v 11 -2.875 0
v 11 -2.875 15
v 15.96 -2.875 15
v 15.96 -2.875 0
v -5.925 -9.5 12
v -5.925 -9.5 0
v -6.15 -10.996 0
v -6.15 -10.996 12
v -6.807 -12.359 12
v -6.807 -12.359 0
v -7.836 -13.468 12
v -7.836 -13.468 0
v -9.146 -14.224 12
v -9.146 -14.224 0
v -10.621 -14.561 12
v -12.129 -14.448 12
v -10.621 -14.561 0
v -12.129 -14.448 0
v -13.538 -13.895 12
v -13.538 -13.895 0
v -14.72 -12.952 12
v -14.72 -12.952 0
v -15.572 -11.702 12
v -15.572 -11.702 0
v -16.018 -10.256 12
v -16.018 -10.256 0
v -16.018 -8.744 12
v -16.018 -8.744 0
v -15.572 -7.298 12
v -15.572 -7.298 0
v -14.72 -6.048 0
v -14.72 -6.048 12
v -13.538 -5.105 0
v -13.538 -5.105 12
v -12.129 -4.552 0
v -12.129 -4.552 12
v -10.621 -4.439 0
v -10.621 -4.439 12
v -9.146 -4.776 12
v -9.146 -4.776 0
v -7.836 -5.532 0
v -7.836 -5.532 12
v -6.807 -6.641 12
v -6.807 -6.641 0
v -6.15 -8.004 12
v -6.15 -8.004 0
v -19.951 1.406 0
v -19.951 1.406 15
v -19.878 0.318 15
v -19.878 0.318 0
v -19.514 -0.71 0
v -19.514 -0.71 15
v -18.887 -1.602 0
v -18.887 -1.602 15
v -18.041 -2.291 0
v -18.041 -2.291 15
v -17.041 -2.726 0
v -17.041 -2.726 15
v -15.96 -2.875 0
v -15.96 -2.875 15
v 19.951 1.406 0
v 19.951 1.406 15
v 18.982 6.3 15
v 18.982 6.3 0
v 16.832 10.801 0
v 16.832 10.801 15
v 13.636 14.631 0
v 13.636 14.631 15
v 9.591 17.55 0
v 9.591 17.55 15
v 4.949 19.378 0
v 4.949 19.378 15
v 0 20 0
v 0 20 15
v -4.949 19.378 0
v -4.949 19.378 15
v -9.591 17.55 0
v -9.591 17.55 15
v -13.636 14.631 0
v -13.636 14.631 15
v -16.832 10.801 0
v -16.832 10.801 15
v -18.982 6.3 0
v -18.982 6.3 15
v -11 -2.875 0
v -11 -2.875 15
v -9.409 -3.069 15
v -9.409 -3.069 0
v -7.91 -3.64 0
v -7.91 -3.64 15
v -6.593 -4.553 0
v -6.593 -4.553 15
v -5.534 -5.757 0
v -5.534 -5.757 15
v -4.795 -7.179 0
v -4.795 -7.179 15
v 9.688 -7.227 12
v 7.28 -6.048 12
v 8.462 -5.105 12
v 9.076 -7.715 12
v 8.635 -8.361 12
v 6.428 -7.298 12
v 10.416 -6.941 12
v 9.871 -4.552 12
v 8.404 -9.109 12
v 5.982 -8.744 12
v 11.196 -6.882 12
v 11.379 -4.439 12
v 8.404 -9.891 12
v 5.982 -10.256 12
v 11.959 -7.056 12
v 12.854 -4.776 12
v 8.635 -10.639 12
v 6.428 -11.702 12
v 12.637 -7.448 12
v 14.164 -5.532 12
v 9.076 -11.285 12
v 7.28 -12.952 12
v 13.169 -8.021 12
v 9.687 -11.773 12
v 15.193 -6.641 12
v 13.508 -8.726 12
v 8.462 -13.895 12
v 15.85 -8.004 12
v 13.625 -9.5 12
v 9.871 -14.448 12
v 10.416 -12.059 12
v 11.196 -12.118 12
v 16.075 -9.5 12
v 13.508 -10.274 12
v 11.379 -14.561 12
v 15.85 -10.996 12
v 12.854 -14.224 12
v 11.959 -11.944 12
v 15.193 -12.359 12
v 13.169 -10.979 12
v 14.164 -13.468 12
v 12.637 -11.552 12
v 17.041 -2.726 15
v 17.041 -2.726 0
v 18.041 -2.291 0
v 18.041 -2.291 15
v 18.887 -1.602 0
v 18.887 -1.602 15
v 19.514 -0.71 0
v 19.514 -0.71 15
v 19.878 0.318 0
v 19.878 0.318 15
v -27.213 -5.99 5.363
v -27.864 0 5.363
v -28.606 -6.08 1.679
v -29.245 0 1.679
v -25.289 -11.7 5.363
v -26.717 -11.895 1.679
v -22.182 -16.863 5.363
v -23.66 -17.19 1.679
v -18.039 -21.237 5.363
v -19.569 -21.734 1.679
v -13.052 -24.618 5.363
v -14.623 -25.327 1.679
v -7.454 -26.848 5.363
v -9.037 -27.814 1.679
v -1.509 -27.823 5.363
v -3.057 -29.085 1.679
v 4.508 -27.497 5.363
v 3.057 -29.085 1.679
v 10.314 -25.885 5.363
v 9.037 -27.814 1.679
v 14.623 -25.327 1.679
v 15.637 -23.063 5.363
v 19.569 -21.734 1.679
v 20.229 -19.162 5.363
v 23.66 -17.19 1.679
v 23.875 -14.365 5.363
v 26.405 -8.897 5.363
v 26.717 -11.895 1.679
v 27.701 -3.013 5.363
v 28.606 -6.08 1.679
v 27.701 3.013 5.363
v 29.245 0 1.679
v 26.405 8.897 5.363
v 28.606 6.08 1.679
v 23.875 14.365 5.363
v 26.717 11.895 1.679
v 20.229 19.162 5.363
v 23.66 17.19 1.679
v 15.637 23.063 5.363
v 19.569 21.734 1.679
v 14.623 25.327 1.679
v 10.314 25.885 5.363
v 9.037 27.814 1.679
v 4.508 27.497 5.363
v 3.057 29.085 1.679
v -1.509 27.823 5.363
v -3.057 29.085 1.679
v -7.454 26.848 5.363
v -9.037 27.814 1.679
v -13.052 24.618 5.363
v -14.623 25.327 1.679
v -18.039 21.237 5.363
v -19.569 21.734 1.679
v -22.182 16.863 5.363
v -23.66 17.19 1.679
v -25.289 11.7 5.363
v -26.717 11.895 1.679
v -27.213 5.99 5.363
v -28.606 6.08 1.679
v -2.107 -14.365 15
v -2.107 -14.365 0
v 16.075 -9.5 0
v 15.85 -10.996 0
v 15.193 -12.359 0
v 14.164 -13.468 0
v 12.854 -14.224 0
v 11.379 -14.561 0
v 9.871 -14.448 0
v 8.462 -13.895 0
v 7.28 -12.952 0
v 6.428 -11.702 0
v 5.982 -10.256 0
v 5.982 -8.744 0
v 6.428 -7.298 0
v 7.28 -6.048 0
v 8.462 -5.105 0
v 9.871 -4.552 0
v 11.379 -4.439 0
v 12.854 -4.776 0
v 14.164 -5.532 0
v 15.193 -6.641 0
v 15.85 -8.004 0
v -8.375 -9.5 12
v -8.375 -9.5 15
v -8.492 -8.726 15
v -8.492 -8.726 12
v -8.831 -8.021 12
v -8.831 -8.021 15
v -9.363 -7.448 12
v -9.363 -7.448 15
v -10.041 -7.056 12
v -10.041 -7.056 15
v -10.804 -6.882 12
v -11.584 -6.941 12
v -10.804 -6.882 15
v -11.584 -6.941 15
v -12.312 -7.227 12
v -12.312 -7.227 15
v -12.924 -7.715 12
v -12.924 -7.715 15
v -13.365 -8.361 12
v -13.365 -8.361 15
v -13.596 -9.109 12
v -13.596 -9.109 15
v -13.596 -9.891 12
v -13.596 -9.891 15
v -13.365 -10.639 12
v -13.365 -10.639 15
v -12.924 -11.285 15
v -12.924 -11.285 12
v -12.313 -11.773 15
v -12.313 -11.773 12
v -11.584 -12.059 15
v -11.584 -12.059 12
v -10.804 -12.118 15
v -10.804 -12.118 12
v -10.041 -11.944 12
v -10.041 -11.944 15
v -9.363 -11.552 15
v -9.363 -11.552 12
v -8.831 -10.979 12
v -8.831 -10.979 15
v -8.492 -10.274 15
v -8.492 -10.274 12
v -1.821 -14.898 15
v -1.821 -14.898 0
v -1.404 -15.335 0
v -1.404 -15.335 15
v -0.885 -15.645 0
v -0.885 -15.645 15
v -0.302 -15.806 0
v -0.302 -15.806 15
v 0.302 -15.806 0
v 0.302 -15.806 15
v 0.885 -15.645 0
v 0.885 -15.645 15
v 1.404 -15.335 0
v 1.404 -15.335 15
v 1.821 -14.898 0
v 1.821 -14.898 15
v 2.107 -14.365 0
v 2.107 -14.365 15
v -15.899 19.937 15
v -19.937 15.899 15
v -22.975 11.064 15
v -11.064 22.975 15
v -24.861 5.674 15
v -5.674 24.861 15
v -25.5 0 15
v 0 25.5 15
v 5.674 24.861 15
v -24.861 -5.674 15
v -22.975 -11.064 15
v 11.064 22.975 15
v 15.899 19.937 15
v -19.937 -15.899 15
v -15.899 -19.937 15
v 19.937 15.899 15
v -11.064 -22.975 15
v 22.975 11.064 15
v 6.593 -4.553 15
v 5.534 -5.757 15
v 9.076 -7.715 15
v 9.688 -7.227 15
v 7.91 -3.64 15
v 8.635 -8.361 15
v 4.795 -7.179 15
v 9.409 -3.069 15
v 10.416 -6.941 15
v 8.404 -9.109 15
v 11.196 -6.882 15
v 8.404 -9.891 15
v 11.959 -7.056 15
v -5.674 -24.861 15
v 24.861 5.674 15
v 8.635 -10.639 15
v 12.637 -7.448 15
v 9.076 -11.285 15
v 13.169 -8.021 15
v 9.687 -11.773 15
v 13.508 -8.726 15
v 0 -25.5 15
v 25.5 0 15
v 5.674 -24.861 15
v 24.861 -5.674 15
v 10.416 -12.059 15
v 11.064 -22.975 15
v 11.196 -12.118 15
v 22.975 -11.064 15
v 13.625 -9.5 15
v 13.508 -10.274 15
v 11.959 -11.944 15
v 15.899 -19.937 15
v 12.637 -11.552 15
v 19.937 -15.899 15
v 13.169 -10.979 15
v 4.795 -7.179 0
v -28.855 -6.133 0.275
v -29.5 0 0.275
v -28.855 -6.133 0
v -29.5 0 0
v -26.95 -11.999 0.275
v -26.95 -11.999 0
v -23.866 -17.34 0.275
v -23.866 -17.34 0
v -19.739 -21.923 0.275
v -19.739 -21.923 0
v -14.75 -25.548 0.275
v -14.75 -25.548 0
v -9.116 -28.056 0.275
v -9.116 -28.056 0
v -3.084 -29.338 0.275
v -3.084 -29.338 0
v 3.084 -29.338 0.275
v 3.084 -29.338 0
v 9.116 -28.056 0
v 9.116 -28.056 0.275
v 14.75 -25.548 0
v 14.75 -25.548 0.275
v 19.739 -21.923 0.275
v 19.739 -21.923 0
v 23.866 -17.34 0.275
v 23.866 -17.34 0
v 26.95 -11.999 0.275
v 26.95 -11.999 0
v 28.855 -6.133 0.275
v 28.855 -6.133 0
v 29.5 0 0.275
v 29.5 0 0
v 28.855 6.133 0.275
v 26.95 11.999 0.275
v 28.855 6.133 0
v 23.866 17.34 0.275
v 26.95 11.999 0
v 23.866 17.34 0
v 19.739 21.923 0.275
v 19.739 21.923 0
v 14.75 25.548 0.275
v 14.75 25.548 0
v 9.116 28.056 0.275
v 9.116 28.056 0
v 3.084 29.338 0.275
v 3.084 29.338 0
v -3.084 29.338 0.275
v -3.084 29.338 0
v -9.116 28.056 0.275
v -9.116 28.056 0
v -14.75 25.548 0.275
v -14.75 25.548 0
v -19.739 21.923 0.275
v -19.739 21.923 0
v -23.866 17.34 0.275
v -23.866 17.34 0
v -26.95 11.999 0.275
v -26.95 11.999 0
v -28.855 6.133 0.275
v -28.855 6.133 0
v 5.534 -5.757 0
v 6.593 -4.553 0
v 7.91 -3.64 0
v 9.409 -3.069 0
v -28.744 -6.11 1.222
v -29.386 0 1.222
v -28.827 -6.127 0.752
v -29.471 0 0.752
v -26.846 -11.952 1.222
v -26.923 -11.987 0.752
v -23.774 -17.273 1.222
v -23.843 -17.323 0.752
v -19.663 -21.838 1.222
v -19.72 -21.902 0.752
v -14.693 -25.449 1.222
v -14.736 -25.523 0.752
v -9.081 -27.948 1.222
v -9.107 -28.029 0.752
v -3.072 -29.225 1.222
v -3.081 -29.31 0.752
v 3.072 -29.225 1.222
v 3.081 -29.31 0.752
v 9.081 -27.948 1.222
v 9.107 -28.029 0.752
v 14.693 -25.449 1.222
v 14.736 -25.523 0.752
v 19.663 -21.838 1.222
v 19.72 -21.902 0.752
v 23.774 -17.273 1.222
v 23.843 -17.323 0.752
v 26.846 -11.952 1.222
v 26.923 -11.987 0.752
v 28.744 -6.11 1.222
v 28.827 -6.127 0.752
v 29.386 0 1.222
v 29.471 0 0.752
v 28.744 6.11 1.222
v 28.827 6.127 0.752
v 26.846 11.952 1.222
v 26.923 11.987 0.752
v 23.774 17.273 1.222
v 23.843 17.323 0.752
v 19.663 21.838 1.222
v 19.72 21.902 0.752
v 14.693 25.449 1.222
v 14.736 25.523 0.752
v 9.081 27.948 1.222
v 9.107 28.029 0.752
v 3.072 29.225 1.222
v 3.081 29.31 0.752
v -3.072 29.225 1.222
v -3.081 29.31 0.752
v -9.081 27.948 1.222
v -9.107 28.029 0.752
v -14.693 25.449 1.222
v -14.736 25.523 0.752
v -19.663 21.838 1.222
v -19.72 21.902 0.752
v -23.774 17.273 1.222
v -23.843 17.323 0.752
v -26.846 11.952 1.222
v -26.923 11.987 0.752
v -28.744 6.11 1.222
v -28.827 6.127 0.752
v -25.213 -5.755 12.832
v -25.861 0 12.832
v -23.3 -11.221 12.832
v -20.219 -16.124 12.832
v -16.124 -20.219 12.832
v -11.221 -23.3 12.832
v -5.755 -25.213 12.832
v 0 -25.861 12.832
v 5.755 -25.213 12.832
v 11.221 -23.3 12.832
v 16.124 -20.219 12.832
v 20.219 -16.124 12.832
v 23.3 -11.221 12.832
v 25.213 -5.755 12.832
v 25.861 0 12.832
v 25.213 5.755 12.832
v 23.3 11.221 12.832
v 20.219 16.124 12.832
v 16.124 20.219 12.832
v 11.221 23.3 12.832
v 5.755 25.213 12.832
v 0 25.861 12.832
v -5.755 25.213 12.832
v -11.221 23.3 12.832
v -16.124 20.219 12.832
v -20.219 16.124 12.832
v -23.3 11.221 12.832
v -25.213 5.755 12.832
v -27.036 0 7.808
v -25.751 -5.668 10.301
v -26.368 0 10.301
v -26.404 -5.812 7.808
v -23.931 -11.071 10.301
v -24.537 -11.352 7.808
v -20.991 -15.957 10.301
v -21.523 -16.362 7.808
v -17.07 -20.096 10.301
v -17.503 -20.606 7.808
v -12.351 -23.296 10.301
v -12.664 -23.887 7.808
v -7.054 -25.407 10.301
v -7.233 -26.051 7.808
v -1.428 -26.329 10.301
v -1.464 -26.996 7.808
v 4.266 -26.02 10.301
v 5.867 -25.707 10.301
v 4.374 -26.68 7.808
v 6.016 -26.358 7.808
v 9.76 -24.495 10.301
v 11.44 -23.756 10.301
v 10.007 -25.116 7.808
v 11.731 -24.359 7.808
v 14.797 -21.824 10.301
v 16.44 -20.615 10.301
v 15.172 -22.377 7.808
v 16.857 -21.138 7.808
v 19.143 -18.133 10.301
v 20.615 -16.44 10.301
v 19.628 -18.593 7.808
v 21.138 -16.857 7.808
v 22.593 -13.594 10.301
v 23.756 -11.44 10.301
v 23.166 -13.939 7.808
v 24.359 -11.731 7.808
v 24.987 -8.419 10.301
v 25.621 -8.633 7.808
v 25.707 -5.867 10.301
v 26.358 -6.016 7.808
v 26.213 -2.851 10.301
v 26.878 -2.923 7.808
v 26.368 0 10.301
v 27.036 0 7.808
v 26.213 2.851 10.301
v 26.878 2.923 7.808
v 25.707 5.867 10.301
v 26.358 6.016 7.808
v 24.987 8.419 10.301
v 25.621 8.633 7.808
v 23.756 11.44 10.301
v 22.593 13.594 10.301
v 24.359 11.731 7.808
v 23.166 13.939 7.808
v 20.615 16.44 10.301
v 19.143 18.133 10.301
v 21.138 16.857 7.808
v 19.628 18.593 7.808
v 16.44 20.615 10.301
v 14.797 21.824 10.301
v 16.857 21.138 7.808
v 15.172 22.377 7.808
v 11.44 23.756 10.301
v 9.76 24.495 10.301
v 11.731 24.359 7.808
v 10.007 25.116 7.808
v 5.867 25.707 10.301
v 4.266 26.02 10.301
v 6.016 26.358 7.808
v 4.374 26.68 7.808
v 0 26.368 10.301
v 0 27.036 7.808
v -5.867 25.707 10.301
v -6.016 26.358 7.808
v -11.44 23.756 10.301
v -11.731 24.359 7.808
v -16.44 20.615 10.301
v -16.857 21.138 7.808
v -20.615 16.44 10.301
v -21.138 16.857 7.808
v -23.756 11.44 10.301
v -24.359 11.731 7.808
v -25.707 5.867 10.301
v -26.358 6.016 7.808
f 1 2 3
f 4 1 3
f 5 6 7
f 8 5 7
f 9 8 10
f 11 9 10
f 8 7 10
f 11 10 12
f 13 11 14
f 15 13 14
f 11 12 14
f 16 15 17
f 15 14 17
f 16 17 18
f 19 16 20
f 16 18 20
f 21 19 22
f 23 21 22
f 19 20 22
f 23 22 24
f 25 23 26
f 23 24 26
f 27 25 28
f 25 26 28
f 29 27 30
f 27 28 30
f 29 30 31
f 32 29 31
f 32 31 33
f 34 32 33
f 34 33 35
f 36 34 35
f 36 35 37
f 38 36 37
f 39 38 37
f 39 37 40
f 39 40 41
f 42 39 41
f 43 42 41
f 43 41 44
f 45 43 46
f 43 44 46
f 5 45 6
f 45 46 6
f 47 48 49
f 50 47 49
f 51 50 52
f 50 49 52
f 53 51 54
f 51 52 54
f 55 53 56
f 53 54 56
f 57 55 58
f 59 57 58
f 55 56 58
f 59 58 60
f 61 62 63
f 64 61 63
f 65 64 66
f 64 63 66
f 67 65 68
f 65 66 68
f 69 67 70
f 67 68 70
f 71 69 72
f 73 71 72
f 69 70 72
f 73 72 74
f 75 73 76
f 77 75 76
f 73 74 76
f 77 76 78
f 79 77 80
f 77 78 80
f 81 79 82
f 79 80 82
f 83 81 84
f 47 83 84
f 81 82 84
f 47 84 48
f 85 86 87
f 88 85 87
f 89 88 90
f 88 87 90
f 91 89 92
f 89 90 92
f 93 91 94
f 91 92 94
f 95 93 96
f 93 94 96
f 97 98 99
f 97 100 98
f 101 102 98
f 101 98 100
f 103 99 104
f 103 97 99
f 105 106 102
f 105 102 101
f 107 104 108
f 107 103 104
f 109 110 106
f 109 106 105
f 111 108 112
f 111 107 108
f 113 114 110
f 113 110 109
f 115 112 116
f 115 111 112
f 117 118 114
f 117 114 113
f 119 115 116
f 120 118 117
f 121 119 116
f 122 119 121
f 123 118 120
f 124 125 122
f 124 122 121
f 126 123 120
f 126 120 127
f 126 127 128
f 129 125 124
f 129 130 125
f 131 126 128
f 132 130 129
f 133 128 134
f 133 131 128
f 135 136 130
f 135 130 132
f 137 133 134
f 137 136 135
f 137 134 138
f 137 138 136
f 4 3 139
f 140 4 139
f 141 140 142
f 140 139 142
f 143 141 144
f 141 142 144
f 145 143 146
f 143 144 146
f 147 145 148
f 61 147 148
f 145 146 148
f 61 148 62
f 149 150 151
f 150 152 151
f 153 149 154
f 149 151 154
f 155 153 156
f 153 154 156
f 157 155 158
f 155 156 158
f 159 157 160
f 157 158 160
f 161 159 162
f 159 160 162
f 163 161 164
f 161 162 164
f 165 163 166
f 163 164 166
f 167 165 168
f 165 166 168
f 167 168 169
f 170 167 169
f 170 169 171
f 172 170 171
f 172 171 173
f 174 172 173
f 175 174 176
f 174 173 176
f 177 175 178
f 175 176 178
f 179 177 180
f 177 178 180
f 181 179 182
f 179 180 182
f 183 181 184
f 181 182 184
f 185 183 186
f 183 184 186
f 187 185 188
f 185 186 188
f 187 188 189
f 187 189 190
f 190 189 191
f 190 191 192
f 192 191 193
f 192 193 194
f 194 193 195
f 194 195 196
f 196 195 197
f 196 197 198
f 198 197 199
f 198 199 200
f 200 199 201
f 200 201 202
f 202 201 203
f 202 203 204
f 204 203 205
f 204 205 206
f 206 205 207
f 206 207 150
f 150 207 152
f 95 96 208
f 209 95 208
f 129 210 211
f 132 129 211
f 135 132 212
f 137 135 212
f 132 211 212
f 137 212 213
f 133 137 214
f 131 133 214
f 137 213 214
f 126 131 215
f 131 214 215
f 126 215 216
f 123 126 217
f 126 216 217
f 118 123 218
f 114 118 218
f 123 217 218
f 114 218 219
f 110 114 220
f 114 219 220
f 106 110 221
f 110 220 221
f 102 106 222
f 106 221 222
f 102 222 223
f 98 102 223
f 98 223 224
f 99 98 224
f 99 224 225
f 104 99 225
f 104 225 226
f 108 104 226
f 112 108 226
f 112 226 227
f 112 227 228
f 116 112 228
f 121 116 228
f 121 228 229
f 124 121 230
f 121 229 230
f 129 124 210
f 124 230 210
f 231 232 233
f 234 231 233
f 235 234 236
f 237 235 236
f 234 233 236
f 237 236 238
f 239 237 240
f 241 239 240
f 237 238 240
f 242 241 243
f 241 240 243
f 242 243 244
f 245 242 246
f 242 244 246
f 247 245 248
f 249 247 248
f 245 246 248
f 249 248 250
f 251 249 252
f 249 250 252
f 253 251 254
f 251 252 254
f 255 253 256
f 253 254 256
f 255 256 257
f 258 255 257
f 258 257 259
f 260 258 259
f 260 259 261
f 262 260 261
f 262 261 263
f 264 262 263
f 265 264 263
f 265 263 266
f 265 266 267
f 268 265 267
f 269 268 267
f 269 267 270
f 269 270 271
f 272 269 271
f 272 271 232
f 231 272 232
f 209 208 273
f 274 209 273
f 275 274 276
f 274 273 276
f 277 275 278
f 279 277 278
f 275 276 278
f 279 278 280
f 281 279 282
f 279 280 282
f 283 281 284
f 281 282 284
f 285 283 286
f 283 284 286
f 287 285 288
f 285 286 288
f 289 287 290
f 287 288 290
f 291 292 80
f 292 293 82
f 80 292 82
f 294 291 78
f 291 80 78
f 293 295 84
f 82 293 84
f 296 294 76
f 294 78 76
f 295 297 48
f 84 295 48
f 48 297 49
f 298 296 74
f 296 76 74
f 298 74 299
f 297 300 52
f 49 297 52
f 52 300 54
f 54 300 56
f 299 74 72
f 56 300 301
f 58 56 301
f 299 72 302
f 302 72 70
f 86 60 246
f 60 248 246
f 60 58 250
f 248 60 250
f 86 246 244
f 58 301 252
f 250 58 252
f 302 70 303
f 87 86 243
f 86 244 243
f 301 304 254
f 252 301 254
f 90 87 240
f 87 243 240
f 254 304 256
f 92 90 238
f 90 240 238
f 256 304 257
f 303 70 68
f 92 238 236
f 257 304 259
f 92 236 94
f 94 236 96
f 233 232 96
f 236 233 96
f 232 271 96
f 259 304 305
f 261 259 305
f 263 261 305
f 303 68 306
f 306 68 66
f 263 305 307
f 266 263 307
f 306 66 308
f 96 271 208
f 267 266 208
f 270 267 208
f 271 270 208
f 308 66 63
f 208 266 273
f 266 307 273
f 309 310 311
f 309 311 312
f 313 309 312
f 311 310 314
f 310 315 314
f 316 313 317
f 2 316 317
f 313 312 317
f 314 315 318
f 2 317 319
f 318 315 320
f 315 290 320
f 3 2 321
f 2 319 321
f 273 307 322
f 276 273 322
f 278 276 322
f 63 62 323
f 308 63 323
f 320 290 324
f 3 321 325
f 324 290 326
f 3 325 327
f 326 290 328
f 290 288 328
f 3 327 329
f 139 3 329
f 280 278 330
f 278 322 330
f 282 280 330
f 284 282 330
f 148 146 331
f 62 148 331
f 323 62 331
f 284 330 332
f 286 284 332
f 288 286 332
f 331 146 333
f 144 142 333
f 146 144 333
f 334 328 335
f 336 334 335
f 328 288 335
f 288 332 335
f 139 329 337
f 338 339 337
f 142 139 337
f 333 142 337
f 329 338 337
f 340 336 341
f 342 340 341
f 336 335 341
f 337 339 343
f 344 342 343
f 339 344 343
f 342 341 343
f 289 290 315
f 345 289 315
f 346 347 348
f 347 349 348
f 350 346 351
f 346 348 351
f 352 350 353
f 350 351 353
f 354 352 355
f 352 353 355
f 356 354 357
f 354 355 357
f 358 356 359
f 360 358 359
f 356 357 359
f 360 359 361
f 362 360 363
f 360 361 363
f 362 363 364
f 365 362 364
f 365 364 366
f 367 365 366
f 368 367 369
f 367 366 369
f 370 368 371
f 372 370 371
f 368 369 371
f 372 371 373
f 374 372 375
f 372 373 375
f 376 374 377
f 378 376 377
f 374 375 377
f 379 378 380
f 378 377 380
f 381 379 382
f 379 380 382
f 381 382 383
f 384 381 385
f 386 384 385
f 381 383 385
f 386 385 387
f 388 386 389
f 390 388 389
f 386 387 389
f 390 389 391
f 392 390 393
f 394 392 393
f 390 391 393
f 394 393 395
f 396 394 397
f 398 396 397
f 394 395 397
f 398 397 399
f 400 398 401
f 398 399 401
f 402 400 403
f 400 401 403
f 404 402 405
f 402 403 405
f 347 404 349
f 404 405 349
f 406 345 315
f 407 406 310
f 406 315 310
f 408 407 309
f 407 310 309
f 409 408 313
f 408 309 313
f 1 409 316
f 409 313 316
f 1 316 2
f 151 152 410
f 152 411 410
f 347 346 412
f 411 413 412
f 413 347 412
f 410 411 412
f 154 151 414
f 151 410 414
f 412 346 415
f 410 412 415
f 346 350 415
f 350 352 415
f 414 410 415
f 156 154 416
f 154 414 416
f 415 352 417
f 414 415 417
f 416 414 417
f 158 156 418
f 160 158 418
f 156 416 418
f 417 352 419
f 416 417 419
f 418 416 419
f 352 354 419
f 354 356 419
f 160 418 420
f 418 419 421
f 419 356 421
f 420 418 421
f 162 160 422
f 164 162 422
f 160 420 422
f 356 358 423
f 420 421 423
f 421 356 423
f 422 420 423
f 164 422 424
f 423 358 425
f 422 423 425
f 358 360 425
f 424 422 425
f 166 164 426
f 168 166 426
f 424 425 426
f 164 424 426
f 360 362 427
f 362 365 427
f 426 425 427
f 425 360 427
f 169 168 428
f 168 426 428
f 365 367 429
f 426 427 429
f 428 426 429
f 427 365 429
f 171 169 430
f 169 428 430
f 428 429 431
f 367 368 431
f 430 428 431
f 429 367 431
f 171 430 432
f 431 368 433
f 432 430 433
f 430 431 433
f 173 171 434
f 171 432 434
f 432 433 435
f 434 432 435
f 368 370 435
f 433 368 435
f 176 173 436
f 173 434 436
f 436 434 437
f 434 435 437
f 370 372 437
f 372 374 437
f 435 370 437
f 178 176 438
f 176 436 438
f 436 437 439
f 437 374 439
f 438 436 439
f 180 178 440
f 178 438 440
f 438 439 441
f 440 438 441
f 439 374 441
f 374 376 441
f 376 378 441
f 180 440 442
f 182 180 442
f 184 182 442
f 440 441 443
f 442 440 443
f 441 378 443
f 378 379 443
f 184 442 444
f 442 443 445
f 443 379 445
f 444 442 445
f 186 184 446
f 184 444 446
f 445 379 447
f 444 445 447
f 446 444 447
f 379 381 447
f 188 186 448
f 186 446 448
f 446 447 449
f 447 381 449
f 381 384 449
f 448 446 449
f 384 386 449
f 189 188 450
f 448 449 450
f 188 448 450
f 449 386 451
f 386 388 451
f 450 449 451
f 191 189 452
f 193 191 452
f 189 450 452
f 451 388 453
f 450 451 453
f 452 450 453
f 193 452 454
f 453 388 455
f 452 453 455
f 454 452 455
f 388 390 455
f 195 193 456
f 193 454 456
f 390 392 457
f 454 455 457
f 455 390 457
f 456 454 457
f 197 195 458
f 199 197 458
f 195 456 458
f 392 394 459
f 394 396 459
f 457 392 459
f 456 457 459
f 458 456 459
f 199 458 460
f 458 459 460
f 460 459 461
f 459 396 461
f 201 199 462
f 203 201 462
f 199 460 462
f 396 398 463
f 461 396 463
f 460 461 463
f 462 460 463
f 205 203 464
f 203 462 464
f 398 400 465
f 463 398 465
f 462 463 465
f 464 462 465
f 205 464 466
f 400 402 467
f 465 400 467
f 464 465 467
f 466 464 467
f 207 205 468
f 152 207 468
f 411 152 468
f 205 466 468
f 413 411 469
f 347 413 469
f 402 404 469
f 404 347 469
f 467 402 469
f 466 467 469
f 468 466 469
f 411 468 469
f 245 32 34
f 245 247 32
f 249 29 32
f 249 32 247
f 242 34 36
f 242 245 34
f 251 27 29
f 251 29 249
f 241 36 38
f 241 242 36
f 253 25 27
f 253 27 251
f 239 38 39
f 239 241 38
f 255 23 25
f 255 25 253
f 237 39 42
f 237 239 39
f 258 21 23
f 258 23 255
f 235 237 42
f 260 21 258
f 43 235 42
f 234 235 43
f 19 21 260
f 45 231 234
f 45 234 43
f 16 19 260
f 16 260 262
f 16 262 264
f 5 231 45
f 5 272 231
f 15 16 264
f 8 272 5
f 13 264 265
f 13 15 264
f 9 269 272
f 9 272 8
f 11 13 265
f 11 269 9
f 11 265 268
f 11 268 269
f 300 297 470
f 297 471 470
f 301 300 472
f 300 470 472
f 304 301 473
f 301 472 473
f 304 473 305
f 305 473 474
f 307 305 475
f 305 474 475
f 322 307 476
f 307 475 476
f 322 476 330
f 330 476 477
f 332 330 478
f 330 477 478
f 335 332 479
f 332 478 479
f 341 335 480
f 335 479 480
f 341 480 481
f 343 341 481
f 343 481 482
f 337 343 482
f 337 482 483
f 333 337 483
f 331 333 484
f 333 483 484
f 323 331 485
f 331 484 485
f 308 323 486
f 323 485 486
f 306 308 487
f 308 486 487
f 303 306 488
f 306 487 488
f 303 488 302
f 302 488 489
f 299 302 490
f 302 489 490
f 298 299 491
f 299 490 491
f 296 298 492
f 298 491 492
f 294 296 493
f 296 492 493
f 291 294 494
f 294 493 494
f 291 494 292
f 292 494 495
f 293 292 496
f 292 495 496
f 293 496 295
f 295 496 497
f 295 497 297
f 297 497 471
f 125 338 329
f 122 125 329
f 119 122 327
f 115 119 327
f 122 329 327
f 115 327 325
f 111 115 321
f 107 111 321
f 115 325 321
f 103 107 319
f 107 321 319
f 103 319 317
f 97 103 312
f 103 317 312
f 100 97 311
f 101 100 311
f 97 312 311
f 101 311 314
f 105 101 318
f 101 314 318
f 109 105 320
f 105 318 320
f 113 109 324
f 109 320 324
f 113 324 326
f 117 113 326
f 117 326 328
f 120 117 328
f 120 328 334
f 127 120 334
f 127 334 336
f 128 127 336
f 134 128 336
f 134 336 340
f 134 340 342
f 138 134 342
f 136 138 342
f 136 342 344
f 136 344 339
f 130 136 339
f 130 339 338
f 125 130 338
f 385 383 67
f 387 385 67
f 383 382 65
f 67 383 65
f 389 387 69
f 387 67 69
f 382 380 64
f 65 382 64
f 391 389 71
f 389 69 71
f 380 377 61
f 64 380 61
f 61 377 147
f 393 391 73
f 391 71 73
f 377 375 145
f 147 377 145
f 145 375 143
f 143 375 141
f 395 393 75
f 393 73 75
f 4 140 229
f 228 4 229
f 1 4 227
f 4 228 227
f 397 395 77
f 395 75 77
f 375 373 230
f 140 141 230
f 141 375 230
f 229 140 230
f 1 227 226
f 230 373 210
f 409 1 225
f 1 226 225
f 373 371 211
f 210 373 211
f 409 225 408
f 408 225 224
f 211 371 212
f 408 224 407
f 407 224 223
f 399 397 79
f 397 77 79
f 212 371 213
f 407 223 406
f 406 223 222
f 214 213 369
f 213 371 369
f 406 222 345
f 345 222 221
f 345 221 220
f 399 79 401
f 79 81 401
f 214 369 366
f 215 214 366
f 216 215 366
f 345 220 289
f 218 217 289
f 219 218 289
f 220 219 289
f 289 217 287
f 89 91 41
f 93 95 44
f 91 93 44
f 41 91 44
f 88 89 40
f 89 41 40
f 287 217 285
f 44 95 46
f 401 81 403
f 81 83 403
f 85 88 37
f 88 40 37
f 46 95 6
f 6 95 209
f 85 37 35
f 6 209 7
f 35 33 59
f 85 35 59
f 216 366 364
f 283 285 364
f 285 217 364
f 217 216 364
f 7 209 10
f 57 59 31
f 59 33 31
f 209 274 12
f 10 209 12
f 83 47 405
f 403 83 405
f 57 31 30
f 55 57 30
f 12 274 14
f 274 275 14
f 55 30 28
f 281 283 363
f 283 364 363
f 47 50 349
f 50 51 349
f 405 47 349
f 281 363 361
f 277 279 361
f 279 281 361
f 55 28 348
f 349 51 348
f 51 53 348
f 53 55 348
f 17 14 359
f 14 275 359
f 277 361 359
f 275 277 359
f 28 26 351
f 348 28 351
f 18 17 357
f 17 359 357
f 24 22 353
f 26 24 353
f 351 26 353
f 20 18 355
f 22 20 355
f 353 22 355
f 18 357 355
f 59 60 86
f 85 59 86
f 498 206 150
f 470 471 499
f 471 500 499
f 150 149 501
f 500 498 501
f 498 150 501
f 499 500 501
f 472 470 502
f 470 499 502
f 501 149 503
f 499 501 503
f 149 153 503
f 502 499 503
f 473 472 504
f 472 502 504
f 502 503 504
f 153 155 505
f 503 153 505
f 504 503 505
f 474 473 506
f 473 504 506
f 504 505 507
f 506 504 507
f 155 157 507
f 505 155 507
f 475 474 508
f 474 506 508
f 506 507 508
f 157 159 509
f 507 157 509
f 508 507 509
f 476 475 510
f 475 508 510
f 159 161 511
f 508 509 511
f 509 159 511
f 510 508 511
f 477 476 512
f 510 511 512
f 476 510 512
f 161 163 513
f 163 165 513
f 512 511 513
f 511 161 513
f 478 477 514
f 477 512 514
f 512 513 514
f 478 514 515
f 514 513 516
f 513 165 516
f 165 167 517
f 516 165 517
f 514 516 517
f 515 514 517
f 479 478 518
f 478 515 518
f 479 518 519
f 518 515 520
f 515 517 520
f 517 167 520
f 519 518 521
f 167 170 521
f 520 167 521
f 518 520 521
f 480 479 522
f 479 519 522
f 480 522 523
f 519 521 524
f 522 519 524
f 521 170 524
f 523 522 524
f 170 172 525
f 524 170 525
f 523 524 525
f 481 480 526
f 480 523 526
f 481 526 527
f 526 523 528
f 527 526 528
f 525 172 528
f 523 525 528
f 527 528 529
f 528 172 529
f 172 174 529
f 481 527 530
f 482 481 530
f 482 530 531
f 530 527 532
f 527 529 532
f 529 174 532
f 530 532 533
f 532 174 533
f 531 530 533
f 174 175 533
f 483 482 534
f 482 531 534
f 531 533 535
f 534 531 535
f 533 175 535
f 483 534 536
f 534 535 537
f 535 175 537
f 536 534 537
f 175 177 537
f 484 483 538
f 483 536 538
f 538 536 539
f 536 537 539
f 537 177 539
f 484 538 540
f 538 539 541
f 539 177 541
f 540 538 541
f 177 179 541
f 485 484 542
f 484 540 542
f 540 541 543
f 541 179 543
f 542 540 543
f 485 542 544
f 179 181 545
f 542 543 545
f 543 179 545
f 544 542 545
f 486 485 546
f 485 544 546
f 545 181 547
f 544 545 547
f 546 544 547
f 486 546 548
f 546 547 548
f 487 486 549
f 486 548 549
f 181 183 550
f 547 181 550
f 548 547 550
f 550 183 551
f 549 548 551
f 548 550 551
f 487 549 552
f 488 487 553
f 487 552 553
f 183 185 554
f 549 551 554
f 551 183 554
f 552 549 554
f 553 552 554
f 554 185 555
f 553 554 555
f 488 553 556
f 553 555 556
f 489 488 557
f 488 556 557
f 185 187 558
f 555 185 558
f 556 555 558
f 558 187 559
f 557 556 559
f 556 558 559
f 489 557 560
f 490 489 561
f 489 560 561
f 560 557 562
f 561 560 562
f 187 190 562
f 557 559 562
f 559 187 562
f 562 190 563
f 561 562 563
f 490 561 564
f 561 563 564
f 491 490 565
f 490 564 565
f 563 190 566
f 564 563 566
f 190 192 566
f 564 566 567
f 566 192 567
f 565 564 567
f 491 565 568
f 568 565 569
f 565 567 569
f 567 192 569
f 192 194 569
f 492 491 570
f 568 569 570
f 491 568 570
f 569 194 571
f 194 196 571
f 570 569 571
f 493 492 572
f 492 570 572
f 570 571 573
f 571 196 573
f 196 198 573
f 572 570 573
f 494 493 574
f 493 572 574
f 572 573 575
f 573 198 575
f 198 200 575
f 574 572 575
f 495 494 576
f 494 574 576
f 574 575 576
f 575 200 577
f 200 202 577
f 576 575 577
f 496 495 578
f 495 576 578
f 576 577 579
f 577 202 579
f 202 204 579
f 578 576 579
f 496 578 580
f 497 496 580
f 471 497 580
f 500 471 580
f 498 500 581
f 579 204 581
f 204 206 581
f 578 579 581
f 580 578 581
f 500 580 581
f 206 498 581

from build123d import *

# Parameters (mm, degrees)
F2_R     = 2.625
F3_DEPTH = 15.001
F4_R     = 5.075
F5_DEPTH = 12


with BuildPart() as f1:
    # F0 (on Front) → F1 (revolve)
    with BuildSketch(Plane.XZ):
        with BuildLine():
            Line((-29.5, 0.274662), (-29.5, 0))
            Line((-29.5, 0), (0, 0))
            Line((0, 0), (0, 15))
            Line((0, 15), (-25.5, 15))
            Line((-25.5, 15), (-25.861378, 12.831729))
            ThreePointArc((-25.861378, 12.831729), (-26.681762, 9.048734), (-27.863968, 5.362751))
            Line((-27.863968, 5.362751), (-29.245317, 1.679155))
            ThreePointArc((-29.245317, 1.679155), (-29.435814, 0.988361), (-29.5, 0.274662))
        make_face()
    revolve(axis=Axis((0, 0, 21.150352), (0, 0, 1)))

    # F2 (on face) → F3 (cut, through all)
    with BuildSketch(Plane.XY.offset(15)):
        with BuildLine():
            ThreePointArc((15.9604, -2.875), (18.886575, -1.602178), (19.9505, 1.40625))
            ThreePointArc((19.9505, 1.40625), (0, 20), (-19.9505, 1.40625))
            ThreePointArc((-19.9505, 1.40625), (-18.886575, -1.602178), (-15.9604, -2.875))
            Line((-15.9604, -2.875), (-11, -2.875))
            ThreePointArc((-11, -2.875), (-7.224013, -4.056421), (-4.794753, -7.179325))
            Line((-4.794753, -7.179325), (-2.107442, -14.364916))
            ThreePointArc((-2.107442, -14.364916), (0, -15.826762), (2.107442, -14.364916))
            Line((2.107442, -14.364916), (4.794753, -7.179325))
            ThreePointArc((4.794753, -7.179325), (7.224013, -4.056421), (11, -2.875))
            Line((11, -2.875), (15.9604, -2.875))
        make_face()
        with Locations((-11, -9.5)):
            Circle(F2_R)
        with Locations((11, -9.5)):
            Circle(F2_R)
    extrude(amount=-F3_DEPTH, mode=Mode.SUBTRACT)

    # F4 (on face) → F5 (cut)
    with BuildSketch(Plane(origin=(0, 0, 0), x_dir=(1, 0, 0), z_dir=(0, 0, -1))):
        with Locations((11, 9.5)):
            Circle(F4_R)
        with Locations((-11, 9.5)):
            Circle(F4_R)
    extrude(amount=-F5_DEPTH, mode=Mode.SUBTRACT)


solid = f1.part
